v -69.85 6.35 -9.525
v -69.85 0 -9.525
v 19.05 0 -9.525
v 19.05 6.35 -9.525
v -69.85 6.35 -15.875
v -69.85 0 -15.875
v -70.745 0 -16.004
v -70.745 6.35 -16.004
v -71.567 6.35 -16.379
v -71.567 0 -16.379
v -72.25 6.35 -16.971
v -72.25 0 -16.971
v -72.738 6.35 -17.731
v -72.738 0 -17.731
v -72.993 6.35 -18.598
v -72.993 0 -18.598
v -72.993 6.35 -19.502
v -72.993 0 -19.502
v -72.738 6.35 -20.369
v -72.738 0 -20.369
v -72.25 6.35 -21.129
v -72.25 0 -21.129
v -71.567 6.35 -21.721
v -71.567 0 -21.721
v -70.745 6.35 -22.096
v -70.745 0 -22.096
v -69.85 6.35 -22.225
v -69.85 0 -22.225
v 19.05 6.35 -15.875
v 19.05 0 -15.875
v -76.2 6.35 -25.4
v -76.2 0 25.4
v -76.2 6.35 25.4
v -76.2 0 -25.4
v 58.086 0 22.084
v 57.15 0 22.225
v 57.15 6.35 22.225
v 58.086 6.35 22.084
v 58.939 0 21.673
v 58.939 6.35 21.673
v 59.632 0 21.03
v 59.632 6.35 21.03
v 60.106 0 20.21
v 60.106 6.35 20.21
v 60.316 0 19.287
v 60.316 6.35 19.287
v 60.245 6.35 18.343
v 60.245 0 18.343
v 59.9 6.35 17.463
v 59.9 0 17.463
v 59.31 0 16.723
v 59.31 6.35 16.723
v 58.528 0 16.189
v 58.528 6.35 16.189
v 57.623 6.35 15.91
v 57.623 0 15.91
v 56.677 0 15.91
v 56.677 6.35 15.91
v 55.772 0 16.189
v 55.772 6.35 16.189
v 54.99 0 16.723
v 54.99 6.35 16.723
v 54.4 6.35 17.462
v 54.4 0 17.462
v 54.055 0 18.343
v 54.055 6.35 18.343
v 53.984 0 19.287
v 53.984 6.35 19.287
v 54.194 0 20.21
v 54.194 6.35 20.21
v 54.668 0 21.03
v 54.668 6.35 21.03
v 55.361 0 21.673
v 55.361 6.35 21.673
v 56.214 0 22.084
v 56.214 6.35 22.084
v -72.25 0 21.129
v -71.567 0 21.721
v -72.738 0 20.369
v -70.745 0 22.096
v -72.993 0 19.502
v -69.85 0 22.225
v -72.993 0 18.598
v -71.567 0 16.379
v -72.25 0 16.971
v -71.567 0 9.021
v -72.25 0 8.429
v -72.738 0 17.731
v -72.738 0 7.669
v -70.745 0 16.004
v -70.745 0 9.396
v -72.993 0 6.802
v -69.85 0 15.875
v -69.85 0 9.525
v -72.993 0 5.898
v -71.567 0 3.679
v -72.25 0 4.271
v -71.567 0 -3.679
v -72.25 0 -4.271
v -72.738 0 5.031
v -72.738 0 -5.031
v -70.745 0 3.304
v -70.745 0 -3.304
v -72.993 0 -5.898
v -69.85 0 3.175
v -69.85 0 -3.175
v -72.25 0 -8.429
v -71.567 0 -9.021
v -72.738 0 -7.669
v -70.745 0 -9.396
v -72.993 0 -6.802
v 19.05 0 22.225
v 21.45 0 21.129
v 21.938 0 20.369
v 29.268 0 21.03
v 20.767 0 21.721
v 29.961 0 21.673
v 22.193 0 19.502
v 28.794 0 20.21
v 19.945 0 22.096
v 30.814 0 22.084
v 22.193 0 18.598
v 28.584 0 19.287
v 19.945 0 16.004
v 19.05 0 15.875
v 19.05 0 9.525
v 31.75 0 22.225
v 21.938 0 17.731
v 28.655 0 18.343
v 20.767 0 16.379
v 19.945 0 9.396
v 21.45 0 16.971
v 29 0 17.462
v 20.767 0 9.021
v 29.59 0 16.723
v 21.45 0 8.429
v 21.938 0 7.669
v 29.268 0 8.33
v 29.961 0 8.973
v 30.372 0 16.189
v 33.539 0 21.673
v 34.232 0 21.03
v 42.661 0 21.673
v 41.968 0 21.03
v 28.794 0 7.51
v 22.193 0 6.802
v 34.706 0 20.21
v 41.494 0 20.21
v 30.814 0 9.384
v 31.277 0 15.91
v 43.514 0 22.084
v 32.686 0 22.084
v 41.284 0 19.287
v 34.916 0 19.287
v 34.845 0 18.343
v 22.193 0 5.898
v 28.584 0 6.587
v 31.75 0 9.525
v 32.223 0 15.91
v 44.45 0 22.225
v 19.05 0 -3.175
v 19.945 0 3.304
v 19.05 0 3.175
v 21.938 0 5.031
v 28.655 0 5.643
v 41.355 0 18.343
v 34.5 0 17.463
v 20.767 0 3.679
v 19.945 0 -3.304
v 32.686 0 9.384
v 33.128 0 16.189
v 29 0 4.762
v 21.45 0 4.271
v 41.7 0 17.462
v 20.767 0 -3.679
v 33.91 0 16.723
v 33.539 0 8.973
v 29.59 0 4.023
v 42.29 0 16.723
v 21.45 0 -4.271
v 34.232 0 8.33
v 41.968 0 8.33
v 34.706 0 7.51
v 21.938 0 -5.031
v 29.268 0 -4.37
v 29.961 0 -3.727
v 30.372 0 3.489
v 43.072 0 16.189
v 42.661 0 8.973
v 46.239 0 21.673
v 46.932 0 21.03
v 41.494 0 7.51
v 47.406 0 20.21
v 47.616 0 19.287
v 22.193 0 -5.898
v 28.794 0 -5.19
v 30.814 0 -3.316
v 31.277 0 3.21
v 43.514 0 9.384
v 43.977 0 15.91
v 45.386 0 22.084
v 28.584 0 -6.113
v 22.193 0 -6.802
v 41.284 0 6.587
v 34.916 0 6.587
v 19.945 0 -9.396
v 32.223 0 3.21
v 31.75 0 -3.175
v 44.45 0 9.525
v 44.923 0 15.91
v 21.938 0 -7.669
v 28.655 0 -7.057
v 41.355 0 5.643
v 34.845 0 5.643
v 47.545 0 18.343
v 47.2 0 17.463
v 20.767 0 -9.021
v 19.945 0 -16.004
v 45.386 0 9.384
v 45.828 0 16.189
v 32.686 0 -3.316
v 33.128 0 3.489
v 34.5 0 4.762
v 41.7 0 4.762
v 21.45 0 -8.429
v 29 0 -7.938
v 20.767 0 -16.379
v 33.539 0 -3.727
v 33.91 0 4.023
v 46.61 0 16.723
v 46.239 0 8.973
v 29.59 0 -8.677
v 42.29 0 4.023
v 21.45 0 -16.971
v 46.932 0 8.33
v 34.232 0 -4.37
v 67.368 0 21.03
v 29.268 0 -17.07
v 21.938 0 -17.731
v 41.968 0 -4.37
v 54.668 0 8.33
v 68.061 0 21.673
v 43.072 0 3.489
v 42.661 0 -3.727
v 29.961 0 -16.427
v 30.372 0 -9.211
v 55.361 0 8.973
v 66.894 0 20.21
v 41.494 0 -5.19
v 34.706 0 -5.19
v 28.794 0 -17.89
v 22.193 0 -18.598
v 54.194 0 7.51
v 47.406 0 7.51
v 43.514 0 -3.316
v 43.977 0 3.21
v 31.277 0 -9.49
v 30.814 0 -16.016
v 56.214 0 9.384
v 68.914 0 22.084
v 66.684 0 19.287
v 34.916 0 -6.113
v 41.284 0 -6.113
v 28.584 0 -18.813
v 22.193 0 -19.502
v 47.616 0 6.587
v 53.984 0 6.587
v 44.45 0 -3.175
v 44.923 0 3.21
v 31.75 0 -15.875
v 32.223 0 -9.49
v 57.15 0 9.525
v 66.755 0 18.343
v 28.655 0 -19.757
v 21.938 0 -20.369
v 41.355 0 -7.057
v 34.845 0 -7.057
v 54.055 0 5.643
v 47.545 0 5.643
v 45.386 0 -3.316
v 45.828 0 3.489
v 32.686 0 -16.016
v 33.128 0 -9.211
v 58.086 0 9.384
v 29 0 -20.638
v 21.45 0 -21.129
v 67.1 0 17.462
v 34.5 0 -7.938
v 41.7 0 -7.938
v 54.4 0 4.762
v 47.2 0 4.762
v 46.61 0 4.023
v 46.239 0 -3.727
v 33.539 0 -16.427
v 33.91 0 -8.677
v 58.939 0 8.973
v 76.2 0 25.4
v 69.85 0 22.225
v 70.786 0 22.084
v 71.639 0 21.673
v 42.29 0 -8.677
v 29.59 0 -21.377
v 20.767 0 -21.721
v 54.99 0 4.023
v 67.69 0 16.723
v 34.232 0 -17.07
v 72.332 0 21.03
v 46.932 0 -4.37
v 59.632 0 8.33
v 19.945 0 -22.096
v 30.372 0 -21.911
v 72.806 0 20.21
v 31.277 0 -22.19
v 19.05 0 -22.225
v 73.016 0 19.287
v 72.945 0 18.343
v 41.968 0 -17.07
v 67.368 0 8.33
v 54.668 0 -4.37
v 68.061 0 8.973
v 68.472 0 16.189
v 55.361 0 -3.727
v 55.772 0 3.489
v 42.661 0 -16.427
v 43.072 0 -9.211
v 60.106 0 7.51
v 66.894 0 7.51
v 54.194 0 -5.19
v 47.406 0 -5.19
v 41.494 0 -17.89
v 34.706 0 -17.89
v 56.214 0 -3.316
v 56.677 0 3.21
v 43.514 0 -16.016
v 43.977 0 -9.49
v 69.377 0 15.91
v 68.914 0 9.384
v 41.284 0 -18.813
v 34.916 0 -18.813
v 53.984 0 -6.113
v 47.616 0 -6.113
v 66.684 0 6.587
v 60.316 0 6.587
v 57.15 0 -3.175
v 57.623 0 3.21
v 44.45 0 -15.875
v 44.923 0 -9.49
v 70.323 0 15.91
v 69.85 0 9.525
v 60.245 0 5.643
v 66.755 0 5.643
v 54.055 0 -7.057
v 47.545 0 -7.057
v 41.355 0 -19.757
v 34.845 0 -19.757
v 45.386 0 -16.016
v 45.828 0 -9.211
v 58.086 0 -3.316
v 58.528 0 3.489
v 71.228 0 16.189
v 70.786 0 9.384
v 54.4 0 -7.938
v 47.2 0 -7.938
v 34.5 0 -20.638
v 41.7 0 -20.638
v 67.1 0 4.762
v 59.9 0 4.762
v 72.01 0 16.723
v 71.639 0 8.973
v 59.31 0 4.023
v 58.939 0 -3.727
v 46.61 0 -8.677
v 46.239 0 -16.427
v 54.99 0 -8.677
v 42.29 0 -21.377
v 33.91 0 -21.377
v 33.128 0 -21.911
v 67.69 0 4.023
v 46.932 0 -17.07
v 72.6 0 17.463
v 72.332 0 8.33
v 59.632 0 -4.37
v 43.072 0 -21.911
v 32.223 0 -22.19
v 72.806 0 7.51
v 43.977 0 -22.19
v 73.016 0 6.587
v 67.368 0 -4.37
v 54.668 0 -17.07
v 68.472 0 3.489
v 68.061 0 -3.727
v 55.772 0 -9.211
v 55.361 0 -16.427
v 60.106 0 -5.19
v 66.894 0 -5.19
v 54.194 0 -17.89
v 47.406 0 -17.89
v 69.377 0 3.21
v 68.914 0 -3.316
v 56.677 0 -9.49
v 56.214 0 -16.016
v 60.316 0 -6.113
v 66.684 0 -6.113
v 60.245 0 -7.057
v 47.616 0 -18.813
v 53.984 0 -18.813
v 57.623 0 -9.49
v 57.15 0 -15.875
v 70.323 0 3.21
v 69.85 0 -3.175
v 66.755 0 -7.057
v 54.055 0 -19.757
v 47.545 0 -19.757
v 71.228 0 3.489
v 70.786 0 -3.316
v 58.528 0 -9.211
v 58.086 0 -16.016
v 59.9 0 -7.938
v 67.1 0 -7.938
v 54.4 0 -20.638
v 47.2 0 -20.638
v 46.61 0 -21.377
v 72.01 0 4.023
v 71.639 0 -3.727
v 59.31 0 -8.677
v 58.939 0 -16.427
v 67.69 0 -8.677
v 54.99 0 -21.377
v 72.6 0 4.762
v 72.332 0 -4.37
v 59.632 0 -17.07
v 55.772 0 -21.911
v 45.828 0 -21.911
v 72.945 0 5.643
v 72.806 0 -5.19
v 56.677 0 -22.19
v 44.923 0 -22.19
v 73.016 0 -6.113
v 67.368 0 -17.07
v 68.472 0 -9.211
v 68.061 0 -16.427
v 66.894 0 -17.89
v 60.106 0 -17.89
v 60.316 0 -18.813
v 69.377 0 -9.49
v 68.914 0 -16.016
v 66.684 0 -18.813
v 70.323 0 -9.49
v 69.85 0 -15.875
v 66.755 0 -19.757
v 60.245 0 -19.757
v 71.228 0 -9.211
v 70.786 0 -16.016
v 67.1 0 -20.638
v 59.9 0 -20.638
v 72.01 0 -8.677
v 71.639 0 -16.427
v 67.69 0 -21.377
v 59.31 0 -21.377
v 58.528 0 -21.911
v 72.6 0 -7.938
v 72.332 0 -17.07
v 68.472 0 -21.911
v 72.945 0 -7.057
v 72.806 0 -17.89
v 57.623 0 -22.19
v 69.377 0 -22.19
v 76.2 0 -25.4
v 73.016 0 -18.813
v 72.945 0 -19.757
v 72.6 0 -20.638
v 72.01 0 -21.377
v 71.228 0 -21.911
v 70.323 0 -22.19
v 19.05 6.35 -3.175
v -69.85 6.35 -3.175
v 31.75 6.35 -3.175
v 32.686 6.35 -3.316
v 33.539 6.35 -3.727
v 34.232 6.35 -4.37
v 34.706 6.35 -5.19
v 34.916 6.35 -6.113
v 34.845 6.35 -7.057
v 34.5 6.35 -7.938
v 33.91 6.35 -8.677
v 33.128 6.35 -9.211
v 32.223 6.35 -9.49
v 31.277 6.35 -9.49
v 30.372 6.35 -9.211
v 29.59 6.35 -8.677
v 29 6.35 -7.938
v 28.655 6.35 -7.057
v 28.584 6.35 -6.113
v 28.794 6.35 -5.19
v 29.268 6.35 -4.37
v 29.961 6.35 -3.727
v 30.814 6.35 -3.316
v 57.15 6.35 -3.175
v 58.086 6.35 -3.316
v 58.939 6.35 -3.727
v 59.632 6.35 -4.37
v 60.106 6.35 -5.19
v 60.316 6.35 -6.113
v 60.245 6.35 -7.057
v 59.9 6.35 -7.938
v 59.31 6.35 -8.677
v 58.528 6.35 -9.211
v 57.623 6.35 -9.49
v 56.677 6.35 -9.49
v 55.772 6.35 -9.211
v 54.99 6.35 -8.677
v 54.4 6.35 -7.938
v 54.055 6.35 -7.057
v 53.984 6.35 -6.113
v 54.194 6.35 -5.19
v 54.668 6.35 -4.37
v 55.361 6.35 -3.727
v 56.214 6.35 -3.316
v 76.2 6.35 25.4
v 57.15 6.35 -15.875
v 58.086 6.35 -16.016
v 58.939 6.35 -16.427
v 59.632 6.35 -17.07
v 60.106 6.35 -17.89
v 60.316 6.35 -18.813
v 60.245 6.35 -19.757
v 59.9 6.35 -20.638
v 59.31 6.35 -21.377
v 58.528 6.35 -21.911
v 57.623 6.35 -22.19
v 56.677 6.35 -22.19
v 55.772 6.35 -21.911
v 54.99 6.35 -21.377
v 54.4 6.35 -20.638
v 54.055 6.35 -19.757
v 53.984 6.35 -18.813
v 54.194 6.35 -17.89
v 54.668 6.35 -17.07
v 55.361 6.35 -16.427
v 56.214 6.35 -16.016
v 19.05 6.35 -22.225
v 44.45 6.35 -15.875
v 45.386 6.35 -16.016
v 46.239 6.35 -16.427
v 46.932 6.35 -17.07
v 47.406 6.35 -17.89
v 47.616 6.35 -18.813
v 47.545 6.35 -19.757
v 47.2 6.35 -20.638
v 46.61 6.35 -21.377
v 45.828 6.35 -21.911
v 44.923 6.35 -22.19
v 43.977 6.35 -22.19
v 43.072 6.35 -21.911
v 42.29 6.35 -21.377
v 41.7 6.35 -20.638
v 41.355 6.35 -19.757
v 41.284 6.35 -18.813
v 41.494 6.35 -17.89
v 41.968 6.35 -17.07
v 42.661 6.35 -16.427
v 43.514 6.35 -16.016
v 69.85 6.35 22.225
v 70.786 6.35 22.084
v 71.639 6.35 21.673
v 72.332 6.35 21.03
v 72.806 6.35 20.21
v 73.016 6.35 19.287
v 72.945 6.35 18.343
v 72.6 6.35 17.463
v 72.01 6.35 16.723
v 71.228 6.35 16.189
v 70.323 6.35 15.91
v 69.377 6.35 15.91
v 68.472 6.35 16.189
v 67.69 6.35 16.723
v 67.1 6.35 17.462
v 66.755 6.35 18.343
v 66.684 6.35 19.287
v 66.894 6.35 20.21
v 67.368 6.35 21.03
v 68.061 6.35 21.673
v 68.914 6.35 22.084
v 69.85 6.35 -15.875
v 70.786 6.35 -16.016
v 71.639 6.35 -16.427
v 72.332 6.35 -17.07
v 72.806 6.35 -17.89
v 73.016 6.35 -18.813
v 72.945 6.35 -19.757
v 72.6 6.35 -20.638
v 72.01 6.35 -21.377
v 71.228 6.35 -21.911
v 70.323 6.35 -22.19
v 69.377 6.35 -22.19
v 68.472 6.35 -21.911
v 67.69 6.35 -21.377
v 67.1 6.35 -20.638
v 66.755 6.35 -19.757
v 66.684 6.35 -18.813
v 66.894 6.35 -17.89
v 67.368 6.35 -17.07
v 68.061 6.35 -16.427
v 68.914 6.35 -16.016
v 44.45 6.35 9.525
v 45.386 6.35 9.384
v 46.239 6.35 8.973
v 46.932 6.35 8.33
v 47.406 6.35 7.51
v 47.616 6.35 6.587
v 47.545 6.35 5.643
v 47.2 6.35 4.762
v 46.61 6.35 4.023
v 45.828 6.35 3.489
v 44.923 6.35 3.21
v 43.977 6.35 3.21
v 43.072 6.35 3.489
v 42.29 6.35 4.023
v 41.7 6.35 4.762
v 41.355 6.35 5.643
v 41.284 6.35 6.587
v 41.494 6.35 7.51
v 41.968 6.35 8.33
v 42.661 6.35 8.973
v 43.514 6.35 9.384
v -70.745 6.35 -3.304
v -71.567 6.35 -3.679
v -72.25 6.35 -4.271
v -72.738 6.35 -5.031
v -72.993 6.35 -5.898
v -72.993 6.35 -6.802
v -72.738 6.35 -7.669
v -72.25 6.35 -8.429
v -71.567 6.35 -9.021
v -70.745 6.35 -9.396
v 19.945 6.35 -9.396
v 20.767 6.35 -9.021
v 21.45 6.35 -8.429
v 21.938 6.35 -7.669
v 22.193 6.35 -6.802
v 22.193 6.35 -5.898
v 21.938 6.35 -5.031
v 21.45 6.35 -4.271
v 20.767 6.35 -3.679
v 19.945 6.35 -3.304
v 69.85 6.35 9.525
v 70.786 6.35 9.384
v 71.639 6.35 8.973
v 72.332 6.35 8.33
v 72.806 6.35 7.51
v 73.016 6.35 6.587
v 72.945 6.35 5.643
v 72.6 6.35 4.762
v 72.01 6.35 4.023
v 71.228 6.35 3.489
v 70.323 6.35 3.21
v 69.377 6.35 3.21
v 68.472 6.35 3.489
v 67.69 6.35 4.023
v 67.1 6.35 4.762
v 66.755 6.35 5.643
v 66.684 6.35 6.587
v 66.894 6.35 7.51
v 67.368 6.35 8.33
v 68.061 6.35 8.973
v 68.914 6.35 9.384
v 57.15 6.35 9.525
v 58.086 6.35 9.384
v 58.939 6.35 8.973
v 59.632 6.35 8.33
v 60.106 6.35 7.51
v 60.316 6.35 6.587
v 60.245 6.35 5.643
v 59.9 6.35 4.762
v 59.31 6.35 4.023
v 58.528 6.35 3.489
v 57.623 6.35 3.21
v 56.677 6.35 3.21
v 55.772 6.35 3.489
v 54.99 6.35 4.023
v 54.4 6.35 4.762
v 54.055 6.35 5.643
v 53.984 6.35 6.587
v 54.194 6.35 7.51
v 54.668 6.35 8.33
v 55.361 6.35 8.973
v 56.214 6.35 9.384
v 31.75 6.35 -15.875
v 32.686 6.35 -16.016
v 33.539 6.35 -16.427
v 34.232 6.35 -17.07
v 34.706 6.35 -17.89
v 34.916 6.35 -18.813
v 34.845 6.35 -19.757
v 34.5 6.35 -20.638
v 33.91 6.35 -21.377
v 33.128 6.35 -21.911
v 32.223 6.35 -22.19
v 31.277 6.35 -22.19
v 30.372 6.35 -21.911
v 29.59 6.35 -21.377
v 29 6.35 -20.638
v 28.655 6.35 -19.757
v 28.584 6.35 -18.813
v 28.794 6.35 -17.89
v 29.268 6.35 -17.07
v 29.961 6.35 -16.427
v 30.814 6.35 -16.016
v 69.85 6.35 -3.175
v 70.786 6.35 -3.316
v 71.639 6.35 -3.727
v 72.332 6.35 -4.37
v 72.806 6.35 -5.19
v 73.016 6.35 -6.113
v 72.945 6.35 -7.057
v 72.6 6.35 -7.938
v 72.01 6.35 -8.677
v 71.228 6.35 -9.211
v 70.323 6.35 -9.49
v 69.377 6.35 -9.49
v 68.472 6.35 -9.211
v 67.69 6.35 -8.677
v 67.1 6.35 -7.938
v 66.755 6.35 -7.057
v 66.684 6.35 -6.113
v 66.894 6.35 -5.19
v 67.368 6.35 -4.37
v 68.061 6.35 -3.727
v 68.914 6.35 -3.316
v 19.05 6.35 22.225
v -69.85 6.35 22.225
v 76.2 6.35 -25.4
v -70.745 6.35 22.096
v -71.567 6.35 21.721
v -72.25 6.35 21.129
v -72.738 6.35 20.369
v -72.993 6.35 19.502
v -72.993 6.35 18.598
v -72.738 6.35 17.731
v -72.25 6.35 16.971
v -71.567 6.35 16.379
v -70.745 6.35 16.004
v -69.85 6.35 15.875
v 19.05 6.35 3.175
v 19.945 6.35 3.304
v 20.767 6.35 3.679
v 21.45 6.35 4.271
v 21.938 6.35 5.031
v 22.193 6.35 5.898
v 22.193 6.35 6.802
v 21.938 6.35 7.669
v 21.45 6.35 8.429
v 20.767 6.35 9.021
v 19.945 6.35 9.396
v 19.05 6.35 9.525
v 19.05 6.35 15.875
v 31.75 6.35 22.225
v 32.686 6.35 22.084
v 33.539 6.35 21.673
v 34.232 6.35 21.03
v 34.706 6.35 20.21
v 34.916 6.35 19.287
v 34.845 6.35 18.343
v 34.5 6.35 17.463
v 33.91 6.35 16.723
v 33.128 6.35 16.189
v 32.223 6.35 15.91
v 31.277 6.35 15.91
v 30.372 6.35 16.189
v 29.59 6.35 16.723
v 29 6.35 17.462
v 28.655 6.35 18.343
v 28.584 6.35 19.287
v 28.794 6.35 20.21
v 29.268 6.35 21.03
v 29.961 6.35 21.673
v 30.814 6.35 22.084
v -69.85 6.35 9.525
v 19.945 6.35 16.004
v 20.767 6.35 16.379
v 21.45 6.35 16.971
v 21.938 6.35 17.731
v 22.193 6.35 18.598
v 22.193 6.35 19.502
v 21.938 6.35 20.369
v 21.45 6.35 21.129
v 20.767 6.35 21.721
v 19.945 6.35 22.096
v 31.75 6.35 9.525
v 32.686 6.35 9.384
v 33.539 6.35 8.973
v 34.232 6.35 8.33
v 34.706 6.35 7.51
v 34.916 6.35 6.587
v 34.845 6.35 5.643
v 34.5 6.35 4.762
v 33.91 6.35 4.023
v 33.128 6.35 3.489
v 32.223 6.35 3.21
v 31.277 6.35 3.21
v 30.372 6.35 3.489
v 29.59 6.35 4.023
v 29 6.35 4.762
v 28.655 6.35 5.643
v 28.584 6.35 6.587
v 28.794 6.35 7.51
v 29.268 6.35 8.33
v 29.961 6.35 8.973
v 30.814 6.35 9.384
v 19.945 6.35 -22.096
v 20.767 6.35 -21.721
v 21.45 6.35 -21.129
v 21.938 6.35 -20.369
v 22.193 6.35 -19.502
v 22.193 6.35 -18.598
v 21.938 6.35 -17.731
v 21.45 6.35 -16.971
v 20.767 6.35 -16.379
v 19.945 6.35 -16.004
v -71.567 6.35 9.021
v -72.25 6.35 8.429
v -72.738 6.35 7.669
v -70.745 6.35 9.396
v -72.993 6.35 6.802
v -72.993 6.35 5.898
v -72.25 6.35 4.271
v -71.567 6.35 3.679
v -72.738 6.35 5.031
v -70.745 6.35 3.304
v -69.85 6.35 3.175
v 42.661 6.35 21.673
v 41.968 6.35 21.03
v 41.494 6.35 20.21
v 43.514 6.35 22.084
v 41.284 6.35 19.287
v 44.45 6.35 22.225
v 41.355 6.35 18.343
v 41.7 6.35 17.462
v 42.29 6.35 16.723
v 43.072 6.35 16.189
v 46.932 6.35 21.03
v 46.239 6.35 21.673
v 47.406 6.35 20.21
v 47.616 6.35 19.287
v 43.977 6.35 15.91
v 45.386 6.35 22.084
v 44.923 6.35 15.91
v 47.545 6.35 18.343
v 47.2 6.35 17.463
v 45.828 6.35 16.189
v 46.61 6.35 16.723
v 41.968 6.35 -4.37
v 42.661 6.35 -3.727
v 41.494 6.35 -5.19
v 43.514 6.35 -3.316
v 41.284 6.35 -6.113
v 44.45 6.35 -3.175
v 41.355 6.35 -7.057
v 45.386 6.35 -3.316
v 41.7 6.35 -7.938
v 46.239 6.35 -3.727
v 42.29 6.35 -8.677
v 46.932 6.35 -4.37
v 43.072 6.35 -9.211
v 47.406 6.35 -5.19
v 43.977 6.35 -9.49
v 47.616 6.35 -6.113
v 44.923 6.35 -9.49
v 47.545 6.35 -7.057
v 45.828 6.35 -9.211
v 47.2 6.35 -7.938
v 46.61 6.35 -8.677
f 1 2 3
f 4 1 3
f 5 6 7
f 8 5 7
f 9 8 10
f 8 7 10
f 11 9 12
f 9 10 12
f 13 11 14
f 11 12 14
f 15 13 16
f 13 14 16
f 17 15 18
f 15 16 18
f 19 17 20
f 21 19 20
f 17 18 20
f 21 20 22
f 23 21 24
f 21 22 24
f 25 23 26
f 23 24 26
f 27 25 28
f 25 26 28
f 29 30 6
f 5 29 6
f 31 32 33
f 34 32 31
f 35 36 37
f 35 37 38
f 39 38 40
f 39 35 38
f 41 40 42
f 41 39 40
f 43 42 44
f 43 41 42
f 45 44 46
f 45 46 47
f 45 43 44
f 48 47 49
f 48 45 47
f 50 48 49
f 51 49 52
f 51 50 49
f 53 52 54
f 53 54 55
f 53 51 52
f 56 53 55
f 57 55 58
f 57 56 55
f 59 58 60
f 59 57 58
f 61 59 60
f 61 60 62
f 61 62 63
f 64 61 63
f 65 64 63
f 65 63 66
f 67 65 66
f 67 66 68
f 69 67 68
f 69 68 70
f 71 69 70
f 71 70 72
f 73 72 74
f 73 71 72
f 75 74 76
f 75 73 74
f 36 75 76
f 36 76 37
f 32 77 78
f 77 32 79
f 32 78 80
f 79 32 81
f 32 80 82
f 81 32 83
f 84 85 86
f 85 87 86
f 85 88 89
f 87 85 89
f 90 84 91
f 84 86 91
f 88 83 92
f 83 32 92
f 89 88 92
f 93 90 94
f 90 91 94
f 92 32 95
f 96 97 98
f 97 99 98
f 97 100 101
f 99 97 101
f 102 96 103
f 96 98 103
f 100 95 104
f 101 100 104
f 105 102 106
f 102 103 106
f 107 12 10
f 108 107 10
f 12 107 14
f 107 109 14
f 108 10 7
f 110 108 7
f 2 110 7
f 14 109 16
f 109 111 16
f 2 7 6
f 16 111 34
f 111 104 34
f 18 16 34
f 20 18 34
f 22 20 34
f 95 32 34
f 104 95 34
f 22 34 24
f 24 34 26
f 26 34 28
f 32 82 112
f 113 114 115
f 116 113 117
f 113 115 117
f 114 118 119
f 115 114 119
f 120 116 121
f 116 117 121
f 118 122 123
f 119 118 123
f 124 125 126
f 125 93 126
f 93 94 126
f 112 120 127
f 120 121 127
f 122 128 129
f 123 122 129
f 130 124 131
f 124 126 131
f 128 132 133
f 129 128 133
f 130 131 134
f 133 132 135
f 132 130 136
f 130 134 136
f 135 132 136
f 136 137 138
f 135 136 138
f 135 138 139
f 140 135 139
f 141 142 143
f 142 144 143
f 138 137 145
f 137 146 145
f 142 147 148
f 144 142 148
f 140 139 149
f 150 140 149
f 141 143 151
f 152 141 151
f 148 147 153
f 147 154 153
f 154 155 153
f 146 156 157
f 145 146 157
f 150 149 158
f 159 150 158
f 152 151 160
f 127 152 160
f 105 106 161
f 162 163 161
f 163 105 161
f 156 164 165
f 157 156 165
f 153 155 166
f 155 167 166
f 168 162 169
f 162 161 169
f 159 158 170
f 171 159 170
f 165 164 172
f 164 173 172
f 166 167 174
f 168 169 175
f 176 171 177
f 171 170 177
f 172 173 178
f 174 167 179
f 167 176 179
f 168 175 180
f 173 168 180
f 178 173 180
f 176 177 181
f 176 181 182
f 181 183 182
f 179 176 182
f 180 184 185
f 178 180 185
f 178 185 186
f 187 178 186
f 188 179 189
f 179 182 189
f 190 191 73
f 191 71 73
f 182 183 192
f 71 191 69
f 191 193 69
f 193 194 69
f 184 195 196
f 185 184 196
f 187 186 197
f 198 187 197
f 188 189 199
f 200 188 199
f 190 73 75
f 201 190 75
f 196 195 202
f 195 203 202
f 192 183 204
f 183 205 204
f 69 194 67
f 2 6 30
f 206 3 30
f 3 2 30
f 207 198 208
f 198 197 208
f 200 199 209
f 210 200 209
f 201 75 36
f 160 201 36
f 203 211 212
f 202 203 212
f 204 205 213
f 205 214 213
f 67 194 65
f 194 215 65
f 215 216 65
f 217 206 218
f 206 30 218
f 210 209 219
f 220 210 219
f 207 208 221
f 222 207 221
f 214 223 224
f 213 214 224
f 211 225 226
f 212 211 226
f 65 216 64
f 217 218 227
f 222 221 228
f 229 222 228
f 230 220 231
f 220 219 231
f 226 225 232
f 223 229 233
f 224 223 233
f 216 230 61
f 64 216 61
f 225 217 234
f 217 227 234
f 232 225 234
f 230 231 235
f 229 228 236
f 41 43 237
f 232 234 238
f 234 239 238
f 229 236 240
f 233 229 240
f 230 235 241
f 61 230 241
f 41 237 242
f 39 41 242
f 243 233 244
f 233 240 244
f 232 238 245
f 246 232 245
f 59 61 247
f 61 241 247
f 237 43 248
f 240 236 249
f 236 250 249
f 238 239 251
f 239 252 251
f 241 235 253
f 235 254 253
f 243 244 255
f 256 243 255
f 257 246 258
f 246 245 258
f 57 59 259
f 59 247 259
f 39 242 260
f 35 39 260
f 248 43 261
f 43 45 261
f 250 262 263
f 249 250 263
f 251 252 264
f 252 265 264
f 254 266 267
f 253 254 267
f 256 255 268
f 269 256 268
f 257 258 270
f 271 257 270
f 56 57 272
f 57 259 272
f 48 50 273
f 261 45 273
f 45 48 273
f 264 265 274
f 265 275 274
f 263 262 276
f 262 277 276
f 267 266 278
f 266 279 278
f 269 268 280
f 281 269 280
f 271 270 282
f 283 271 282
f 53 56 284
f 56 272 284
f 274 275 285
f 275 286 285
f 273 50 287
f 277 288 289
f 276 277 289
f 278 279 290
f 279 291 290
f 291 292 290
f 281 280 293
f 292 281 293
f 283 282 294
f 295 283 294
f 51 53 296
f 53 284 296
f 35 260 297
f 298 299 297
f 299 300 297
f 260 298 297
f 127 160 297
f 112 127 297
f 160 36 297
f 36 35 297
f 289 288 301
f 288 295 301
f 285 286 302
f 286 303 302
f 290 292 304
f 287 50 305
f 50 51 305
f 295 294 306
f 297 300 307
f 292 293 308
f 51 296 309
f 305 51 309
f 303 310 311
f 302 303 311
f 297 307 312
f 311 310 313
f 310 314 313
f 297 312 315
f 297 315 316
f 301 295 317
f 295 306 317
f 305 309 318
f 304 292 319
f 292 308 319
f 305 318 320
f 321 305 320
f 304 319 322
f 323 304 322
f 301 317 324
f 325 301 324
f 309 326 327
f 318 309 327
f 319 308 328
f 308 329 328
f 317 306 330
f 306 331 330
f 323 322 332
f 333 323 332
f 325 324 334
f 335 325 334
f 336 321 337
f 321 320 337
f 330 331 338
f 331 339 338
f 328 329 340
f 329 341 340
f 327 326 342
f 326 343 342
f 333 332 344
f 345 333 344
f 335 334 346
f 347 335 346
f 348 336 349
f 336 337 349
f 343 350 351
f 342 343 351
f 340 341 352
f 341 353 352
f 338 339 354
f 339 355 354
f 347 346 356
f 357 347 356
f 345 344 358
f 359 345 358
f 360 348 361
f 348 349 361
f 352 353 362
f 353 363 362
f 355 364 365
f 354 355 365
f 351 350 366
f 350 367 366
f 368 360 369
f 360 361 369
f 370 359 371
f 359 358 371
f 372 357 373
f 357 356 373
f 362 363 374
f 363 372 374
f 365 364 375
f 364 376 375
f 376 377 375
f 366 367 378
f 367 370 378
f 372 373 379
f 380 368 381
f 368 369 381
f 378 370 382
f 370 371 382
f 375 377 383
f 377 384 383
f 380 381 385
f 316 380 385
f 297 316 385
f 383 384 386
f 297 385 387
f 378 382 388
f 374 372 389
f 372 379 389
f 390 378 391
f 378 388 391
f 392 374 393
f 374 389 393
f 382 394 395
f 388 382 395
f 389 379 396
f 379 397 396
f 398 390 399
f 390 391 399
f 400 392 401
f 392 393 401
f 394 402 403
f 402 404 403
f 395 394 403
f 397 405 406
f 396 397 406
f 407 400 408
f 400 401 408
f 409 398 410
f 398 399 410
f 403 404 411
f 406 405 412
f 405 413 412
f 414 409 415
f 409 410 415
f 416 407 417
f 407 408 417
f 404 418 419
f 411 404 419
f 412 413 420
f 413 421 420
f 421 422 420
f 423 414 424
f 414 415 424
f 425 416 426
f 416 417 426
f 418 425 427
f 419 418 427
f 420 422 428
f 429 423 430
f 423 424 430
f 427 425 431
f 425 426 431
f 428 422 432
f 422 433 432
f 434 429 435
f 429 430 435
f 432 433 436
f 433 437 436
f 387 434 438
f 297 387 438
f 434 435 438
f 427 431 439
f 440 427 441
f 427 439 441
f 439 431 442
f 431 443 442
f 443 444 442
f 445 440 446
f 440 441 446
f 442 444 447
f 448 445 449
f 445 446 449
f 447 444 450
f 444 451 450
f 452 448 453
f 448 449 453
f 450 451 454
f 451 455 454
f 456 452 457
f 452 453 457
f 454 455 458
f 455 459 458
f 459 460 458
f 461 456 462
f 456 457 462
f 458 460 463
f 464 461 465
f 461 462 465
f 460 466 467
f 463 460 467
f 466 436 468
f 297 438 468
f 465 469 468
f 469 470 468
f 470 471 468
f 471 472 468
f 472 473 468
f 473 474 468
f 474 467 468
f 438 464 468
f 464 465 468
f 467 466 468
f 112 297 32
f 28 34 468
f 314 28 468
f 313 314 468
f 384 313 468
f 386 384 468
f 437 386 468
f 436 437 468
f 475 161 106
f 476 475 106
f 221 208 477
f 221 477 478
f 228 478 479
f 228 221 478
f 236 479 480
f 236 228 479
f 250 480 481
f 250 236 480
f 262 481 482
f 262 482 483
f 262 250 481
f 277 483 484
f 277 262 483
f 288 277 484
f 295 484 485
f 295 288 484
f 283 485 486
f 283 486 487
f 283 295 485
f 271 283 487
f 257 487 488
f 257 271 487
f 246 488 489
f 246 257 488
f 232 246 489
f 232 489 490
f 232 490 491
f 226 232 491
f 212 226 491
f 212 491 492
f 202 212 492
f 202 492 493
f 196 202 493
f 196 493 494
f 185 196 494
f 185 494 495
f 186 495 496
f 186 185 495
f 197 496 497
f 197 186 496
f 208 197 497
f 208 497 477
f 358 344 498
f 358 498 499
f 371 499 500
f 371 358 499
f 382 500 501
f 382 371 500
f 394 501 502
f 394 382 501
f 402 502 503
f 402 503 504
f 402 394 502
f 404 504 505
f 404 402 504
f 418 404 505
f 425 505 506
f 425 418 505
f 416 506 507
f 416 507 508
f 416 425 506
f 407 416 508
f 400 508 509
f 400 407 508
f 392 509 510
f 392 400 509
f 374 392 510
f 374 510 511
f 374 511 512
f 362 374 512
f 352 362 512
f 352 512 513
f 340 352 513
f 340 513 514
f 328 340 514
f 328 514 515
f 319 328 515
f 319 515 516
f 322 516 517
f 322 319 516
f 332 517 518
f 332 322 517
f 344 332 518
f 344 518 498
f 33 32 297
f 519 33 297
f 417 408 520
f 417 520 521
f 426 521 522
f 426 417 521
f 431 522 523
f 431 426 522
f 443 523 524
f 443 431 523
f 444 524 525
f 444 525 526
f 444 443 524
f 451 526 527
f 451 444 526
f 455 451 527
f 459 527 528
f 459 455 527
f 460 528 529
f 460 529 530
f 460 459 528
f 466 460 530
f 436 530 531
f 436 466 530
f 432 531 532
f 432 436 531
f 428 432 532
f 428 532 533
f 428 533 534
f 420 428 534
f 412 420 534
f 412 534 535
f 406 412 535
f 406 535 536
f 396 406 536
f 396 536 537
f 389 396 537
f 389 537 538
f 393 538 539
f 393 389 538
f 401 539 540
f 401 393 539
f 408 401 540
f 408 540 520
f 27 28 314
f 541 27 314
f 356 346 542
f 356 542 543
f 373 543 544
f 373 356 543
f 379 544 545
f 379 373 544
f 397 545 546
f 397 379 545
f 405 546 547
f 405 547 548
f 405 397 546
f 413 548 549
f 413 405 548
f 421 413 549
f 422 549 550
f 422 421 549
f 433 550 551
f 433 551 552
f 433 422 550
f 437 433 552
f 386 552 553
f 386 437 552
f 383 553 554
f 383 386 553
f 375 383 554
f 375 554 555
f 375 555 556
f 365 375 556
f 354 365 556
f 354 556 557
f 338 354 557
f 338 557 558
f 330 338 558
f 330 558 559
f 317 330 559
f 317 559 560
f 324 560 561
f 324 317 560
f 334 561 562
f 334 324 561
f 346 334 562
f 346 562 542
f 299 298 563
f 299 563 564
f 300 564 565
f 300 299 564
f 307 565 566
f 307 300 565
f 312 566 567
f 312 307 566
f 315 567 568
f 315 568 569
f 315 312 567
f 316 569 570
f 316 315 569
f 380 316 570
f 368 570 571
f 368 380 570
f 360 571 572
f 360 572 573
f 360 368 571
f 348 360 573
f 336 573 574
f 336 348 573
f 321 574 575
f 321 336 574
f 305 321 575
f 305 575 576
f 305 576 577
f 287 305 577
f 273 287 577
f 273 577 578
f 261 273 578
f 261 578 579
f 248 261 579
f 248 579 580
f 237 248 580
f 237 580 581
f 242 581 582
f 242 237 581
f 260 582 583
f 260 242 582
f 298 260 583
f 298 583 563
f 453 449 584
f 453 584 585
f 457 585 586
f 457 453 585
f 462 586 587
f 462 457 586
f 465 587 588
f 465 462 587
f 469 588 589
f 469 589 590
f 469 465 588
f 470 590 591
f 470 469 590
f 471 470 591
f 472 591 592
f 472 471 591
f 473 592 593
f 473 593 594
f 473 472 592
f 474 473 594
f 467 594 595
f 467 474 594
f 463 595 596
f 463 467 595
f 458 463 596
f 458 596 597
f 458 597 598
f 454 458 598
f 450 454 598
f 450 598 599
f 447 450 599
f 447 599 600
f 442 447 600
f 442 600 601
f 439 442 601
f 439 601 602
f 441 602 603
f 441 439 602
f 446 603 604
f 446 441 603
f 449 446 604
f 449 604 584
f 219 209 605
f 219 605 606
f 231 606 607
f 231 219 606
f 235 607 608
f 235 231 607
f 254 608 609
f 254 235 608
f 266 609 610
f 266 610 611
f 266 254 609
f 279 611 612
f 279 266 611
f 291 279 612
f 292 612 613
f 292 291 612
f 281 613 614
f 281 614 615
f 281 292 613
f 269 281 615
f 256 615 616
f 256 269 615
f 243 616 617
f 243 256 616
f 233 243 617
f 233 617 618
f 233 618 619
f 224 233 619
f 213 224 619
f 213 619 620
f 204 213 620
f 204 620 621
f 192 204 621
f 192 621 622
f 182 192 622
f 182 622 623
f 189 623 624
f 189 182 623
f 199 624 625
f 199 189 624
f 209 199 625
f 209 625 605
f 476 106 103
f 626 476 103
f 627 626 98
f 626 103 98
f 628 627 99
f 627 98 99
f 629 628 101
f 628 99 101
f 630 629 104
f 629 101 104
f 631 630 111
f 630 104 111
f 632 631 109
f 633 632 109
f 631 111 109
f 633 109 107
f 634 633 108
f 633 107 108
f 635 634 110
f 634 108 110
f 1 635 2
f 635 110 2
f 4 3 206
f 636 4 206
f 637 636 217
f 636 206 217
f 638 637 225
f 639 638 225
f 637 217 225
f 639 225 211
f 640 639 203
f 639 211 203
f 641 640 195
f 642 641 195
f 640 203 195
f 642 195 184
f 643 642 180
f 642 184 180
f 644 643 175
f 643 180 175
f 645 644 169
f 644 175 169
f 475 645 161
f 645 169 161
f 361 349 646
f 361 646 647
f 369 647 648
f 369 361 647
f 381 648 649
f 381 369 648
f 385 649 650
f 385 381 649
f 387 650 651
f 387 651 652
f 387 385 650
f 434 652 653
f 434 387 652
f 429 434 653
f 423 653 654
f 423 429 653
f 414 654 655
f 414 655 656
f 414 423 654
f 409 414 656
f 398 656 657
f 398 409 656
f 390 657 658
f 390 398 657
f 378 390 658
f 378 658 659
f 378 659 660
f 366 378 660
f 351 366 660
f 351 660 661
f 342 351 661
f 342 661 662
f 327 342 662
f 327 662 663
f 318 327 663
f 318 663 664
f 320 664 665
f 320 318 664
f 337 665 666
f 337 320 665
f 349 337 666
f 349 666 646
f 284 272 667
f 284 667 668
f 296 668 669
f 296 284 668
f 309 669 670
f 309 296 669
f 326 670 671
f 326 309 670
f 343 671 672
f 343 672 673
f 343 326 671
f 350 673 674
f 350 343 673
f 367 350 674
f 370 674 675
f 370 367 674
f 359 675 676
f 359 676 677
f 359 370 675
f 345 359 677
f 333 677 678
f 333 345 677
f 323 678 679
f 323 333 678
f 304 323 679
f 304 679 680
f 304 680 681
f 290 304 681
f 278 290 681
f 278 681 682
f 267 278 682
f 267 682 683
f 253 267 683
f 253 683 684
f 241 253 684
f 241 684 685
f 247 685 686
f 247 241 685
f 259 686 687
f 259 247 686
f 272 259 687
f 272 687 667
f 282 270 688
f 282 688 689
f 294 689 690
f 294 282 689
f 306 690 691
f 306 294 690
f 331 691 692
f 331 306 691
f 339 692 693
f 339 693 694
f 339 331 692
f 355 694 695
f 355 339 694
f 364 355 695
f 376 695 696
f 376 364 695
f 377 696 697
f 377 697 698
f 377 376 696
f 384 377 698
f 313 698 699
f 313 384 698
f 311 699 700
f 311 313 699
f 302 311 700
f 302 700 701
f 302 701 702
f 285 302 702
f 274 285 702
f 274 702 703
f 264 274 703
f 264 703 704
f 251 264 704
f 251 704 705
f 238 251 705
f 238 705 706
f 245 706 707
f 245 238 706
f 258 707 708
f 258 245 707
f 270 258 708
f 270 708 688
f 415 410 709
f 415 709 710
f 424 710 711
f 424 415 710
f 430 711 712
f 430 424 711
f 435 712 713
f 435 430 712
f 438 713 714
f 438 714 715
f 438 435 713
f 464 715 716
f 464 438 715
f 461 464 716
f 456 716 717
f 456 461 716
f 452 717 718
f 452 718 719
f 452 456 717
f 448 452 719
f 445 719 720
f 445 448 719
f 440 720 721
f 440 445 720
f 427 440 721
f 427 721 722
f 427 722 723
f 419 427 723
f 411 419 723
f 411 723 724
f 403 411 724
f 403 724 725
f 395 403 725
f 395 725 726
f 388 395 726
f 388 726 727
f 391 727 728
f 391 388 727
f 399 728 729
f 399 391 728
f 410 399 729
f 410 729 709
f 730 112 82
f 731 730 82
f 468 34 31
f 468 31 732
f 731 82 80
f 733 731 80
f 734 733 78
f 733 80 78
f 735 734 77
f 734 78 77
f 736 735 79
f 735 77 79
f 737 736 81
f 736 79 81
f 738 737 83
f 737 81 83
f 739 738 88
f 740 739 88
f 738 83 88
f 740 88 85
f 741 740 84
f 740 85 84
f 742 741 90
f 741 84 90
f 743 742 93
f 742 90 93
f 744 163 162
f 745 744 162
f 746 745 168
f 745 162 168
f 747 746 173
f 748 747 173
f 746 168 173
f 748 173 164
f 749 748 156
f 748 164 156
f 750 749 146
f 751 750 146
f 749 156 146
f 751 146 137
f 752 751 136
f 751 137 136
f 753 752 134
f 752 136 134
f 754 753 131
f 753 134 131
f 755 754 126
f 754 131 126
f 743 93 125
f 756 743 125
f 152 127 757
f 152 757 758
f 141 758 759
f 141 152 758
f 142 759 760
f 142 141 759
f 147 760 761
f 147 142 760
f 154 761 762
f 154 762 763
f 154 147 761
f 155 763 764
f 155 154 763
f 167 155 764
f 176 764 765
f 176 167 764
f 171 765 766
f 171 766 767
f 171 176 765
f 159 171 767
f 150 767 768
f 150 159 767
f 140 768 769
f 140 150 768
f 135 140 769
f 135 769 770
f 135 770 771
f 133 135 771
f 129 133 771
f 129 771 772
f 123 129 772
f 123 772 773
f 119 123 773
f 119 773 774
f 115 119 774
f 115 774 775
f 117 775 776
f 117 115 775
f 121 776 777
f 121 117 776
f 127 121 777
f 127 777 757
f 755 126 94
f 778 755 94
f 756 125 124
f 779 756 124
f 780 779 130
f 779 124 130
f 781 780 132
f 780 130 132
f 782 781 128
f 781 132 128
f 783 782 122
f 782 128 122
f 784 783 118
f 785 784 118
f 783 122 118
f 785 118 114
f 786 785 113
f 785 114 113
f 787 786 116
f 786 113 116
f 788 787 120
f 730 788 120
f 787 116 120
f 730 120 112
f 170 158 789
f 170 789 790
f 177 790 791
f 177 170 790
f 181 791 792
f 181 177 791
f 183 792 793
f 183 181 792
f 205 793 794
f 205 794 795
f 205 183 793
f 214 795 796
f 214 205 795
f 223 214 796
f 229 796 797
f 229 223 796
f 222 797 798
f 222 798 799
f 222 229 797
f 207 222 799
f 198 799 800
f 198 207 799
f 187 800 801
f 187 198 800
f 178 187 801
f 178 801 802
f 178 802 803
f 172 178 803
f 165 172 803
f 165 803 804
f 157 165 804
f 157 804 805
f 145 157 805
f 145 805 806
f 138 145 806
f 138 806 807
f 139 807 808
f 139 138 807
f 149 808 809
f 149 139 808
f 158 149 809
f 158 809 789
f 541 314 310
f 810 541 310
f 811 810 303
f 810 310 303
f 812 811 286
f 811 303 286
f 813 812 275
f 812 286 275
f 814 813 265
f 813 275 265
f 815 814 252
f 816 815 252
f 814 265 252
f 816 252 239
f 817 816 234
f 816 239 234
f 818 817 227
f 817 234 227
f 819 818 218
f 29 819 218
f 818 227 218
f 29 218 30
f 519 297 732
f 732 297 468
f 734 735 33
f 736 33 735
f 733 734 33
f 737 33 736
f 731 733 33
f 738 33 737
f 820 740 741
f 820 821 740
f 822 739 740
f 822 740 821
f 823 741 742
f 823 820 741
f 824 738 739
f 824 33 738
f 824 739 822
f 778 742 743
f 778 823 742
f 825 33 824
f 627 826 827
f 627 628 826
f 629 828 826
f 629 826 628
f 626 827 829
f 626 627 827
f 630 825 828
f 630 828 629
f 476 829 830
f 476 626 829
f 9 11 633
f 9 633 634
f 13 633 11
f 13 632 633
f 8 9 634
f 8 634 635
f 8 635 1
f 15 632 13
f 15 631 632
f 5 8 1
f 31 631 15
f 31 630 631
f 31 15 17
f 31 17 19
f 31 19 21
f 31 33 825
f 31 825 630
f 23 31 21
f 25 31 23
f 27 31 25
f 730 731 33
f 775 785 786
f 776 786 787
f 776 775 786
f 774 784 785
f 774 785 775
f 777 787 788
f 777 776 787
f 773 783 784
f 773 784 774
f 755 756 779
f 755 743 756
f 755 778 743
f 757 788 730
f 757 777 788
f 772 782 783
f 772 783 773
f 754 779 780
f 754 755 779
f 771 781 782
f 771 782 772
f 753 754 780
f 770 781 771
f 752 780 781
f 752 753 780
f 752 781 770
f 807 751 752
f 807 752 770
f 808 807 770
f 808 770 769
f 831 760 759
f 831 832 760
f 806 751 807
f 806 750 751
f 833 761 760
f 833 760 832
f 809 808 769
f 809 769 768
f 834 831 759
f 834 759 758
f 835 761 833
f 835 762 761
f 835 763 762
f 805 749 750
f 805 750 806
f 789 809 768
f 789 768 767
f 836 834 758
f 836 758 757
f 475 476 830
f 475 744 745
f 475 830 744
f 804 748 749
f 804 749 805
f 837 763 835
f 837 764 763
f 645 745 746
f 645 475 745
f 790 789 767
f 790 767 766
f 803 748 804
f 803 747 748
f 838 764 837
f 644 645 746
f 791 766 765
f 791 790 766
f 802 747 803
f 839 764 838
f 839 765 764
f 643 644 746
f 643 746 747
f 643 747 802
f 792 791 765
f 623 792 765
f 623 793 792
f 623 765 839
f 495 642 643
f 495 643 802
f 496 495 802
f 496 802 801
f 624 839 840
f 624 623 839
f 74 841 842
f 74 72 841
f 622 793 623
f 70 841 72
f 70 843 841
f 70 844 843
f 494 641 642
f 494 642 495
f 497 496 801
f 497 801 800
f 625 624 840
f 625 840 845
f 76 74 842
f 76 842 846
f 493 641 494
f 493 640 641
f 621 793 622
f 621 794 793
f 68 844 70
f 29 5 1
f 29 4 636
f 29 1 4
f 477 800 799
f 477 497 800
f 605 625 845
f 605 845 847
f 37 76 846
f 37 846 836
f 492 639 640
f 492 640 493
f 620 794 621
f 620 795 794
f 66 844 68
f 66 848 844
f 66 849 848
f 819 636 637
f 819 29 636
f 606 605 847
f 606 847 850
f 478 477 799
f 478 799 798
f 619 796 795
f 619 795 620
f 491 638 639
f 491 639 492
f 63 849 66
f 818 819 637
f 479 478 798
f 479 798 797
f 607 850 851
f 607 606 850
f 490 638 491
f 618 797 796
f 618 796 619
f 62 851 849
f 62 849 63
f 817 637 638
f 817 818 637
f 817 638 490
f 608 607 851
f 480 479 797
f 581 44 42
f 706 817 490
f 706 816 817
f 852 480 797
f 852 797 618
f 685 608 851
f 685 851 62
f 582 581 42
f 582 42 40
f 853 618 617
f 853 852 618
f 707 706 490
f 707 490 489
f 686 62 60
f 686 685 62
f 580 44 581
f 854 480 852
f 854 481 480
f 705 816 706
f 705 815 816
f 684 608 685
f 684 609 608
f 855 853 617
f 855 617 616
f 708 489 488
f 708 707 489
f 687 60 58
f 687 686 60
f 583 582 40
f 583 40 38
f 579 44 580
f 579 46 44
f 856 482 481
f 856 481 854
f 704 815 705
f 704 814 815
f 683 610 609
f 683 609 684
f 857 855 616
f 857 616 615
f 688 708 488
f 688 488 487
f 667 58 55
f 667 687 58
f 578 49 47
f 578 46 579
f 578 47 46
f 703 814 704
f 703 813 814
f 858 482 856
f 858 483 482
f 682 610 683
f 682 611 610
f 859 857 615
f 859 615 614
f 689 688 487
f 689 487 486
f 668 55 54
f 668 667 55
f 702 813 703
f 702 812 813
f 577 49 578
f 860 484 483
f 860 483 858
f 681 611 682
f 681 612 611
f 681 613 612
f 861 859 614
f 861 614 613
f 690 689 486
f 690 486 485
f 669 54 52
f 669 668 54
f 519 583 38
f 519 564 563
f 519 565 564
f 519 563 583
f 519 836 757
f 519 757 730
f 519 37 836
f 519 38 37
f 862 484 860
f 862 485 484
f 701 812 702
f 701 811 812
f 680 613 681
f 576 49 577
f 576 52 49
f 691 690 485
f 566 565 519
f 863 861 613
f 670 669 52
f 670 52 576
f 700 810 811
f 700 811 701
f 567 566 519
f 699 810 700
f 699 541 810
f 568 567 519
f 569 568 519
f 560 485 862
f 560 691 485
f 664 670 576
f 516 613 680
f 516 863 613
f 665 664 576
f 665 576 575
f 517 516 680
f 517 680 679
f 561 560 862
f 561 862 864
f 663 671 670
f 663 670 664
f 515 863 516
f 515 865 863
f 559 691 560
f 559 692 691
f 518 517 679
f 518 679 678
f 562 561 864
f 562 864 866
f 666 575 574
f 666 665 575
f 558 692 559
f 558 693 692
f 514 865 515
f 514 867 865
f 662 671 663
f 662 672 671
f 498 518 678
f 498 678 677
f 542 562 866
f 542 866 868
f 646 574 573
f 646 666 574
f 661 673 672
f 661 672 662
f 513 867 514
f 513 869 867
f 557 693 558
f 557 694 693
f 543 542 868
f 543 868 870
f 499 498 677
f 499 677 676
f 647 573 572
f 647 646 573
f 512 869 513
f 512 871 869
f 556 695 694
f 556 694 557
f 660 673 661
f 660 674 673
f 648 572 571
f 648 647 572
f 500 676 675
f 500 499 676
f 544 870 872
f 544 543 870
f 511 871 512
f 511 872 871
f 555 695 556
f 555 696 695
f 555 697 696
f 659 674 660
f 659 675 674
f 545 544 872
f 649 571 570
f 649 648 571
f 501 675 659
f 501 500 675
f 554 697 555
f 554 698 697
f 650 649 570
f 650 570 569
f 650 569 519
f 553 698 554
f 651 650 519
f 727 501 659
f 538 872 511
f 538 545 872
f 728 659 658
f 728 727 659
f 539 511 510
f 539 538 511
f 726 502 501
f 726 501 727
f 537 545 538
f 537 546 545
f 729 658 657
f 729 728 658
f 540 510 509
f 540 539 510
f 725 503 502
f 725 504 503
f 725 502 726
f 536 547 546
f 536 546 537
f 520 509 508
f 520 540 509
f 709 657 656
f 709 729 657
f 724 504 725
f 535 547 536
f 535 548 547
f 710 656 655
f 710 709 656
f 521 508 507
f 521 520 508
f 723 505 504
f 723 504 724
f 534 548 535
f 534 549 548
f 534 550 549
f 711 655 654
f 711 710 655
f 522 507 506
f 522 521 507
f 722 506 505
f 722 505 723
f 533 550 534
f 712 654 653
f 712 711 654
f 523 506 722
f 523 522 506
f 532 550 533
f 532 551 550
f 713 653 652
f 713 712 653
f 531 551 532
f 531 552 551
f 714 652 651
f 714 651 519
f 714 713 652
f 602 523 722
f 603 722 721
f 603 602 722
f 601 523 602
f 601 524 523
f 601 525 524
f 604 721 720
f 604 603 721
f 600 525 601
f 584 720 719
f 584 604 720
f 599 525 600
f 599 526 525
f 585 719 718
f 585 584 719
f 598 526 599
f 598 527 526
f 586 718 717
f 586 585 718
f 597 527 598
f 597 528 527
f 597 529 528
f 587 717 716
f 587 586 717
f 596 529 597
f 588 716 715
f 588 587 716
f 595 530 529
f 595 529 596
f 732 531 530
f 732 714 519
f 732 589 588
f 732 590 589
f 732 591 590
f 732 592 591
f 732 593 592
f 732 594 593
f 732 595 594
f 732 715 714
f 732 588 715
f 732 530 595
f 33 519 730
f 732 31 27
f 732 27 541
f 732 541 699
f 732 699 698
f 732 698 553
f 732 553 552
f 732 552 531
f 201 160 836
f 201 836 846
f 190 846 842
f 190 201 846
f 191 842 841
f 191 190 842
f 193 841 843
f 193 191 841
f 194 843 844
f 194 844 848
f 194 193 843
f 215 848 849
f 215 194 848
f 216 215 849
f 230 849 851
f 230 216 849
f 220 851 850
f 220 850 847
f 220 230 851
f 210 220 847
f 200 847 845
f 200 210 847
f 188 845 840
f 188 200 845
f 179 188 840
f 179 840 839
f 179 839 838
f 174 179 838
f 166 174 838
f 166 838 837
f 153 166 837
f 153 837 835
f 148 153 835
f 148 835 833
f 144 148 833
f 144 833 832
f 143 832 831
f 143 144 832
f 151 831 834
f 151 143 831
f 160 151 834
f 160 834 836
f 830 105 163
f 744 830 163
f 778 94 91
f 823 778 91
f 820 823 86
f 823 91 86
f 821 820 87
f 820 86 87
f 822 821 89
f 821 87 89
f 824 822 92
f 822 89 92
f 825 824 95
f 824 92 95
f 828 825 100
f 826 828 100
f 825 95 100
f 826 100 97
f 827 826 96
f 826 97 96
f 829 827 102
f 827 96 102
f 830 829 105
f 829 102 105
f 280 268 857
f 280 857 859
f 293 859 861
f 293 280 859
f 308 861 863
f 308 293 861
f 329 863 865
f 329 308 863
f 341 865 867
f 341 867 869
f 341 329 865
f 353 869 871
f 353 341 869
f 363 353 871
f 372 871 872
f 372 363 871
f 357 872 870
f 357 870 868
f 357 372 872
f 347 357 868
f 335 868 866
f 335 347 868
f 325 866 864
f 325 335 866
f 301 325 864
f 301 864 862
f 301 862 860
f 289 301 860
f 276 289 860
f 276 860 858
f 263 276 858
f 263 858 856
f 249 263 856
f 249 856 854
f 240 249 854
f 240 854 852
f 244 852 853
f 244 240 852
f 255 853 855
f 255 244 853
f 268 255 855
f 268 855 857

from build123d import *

# Parameters (mm, degrees)
SKETCH1_W           = 152.4
SKETCH1_H           = 50.8
SKETCH1_R           = 3.175
BOSS_EXTRUDE1_DEPTH = 6.35


with BuildPart() as part:
    # Sketch1 → Boss-Extrude1 (new body)
    with BuildSketch(Plane(origin=(0, 0, 0), x_dir=(1, 0, 0), z_dir=(0, 1, 0))):
        Rectangle(SKETCH1_W, SKETCH1_H)
        with Locations(Location((31.75, 19.05, 0), (0, 0, 270))):
            Circle(SKETCH1_R, mode=Mode.SUBTRACT)
        with Locations(Location((44.45, 19.05, 0), (0, 0, 270))):
            Circle(SKETCH1_R, mode=Mode.SUBTRACT)
        with Locations(Location((57.15, 19.05, 0), (0, 0, 270))):
            Circle(SKETCH1_R, mode=Mode.SUBTRACT)
        with Locations(Location((31.75, 6.35, 0), (0, 0, 270))):
            Circle(SKETCH1_R, mode=Mode.SUBTRACT)
        with Locations(Location((44.45, 6.35, 0), (0, 0, 270))):
            Circle(SKETCH1_R, mode=Mode.SUBTRACT)
        with Locations(Location((57.15, 6.35, 0), (0, 0, 270))):
            Circle(SKETCH1_R, mode=Mode.SUBTRACT)
        with Locations(Location((69.85, 6.35, 0), (0, 0, 270))):
            Circle(SKETCH1_R, mode=Mode.SUBTRACT)
        with Locations(Location((31.75, -6.35, 0), (0, 0, 270))):
            Circle(SKETCH1_R, mode=Mode.SUBTRACT)
        with Locations(Location((44.45, -6.35, 0), (0, 0, 270))):
            Circle(SKETCH1_R, mode=Mode.SUBTRACT)
        with Locations(Location((57.15, -6.35, 0), (0, 0, 270))):
            Circle(SKETCH1_R, mode=Mode.SUBTRACT)
        with Locations(Location((69.85, -6.35, 0), (0, 0, 270))):
            Circle(SKETCH1_R, mode=Mode.SUBTRACT)
        with Locations(Location((31.75, -19.05, 0), (0, 0, 270))):
            Circle(SKETCH1_R, mode=Mode.SUBTRACT)
        with Locations(Location((69.85, 19.05, 0), (0, 0, 270))):
            Circle(SKETCH1_R, mode=Mode.SUBTRACT)
        with Locations(Location((44.45, -19.05, 0), (0, 0, 270))):
            Circle(SKETCH1_R, mode=Mode.SUBTRACT)
        with Locations(Location((57.15, -19.05, 0), (0, 0, 270))):
            Circle(SKETCH1_R, mode=Mode.SUBTRACT)
        with Locations(Location((69.85, -19.05, 0), (0, 0, 270))):
            Circle(SKETCH1_R, mode=Mode.SUBTRACT)
        with BuildLine():
            Line((-69.85, 22.225), (19.05, 22.225))
            ThreePointArc((19.05, 22.225), (22.225, 19.05), (19.05, 15.875))
            Line((19.05, 15.875), (-69.85, 15.875))
            ThreePointArc((-69.85, 15.875), (-73.025, 19.05), (-69.85, 22.225))
        make_face(mode=Mode.SUBTRACT)
        with BuildLine():
            Line((19.05, 3.175), (-69.85, 3.175))
            ThreePointArc((-69.85, 3.175), (-73.025, 6.35), (-69.85, 9.525))
            Line((-69.85, 9.525), (19.05, 9.525))
            ThreePointArc((19.05, 9.525), (22.225, 6.35), (19.05, 3.175))
        make_face(mode=Mode.SUBTRACT)
        with BuildLine():
            Line((19.05, -9.525), (-69.85, -9.525))
            ThreePointArc((-69.85, -9.525), (-73.025, -6.35), (-69.85, -3.175))
            Line((-69.85, -3.175), (19.05, -3.175))
            ThreePointArc((19.05, -3.175), (22.225, -6.35), (19.05, -9.525))
        make_face(mode=Mode.SUBTRACT)
        with BuildLine():
            Line((19.05, -22.225), (-69.85, -22.225))
            ThreePointArc((-69.85, -22.225), (-73.025, -19.05), (-69.85, -15.875))
            Line((-69.85, -15.875), (19.05, -15.875))
            ThreePointArc((19.05, -15.875), (22.225, -19.05), (19.05, -22.225))
        make_face(mode=Mode.SUBTRACT)
    extrude(amount=BOSS_EXTRUDE1_DEPTH)


solid = part.part
